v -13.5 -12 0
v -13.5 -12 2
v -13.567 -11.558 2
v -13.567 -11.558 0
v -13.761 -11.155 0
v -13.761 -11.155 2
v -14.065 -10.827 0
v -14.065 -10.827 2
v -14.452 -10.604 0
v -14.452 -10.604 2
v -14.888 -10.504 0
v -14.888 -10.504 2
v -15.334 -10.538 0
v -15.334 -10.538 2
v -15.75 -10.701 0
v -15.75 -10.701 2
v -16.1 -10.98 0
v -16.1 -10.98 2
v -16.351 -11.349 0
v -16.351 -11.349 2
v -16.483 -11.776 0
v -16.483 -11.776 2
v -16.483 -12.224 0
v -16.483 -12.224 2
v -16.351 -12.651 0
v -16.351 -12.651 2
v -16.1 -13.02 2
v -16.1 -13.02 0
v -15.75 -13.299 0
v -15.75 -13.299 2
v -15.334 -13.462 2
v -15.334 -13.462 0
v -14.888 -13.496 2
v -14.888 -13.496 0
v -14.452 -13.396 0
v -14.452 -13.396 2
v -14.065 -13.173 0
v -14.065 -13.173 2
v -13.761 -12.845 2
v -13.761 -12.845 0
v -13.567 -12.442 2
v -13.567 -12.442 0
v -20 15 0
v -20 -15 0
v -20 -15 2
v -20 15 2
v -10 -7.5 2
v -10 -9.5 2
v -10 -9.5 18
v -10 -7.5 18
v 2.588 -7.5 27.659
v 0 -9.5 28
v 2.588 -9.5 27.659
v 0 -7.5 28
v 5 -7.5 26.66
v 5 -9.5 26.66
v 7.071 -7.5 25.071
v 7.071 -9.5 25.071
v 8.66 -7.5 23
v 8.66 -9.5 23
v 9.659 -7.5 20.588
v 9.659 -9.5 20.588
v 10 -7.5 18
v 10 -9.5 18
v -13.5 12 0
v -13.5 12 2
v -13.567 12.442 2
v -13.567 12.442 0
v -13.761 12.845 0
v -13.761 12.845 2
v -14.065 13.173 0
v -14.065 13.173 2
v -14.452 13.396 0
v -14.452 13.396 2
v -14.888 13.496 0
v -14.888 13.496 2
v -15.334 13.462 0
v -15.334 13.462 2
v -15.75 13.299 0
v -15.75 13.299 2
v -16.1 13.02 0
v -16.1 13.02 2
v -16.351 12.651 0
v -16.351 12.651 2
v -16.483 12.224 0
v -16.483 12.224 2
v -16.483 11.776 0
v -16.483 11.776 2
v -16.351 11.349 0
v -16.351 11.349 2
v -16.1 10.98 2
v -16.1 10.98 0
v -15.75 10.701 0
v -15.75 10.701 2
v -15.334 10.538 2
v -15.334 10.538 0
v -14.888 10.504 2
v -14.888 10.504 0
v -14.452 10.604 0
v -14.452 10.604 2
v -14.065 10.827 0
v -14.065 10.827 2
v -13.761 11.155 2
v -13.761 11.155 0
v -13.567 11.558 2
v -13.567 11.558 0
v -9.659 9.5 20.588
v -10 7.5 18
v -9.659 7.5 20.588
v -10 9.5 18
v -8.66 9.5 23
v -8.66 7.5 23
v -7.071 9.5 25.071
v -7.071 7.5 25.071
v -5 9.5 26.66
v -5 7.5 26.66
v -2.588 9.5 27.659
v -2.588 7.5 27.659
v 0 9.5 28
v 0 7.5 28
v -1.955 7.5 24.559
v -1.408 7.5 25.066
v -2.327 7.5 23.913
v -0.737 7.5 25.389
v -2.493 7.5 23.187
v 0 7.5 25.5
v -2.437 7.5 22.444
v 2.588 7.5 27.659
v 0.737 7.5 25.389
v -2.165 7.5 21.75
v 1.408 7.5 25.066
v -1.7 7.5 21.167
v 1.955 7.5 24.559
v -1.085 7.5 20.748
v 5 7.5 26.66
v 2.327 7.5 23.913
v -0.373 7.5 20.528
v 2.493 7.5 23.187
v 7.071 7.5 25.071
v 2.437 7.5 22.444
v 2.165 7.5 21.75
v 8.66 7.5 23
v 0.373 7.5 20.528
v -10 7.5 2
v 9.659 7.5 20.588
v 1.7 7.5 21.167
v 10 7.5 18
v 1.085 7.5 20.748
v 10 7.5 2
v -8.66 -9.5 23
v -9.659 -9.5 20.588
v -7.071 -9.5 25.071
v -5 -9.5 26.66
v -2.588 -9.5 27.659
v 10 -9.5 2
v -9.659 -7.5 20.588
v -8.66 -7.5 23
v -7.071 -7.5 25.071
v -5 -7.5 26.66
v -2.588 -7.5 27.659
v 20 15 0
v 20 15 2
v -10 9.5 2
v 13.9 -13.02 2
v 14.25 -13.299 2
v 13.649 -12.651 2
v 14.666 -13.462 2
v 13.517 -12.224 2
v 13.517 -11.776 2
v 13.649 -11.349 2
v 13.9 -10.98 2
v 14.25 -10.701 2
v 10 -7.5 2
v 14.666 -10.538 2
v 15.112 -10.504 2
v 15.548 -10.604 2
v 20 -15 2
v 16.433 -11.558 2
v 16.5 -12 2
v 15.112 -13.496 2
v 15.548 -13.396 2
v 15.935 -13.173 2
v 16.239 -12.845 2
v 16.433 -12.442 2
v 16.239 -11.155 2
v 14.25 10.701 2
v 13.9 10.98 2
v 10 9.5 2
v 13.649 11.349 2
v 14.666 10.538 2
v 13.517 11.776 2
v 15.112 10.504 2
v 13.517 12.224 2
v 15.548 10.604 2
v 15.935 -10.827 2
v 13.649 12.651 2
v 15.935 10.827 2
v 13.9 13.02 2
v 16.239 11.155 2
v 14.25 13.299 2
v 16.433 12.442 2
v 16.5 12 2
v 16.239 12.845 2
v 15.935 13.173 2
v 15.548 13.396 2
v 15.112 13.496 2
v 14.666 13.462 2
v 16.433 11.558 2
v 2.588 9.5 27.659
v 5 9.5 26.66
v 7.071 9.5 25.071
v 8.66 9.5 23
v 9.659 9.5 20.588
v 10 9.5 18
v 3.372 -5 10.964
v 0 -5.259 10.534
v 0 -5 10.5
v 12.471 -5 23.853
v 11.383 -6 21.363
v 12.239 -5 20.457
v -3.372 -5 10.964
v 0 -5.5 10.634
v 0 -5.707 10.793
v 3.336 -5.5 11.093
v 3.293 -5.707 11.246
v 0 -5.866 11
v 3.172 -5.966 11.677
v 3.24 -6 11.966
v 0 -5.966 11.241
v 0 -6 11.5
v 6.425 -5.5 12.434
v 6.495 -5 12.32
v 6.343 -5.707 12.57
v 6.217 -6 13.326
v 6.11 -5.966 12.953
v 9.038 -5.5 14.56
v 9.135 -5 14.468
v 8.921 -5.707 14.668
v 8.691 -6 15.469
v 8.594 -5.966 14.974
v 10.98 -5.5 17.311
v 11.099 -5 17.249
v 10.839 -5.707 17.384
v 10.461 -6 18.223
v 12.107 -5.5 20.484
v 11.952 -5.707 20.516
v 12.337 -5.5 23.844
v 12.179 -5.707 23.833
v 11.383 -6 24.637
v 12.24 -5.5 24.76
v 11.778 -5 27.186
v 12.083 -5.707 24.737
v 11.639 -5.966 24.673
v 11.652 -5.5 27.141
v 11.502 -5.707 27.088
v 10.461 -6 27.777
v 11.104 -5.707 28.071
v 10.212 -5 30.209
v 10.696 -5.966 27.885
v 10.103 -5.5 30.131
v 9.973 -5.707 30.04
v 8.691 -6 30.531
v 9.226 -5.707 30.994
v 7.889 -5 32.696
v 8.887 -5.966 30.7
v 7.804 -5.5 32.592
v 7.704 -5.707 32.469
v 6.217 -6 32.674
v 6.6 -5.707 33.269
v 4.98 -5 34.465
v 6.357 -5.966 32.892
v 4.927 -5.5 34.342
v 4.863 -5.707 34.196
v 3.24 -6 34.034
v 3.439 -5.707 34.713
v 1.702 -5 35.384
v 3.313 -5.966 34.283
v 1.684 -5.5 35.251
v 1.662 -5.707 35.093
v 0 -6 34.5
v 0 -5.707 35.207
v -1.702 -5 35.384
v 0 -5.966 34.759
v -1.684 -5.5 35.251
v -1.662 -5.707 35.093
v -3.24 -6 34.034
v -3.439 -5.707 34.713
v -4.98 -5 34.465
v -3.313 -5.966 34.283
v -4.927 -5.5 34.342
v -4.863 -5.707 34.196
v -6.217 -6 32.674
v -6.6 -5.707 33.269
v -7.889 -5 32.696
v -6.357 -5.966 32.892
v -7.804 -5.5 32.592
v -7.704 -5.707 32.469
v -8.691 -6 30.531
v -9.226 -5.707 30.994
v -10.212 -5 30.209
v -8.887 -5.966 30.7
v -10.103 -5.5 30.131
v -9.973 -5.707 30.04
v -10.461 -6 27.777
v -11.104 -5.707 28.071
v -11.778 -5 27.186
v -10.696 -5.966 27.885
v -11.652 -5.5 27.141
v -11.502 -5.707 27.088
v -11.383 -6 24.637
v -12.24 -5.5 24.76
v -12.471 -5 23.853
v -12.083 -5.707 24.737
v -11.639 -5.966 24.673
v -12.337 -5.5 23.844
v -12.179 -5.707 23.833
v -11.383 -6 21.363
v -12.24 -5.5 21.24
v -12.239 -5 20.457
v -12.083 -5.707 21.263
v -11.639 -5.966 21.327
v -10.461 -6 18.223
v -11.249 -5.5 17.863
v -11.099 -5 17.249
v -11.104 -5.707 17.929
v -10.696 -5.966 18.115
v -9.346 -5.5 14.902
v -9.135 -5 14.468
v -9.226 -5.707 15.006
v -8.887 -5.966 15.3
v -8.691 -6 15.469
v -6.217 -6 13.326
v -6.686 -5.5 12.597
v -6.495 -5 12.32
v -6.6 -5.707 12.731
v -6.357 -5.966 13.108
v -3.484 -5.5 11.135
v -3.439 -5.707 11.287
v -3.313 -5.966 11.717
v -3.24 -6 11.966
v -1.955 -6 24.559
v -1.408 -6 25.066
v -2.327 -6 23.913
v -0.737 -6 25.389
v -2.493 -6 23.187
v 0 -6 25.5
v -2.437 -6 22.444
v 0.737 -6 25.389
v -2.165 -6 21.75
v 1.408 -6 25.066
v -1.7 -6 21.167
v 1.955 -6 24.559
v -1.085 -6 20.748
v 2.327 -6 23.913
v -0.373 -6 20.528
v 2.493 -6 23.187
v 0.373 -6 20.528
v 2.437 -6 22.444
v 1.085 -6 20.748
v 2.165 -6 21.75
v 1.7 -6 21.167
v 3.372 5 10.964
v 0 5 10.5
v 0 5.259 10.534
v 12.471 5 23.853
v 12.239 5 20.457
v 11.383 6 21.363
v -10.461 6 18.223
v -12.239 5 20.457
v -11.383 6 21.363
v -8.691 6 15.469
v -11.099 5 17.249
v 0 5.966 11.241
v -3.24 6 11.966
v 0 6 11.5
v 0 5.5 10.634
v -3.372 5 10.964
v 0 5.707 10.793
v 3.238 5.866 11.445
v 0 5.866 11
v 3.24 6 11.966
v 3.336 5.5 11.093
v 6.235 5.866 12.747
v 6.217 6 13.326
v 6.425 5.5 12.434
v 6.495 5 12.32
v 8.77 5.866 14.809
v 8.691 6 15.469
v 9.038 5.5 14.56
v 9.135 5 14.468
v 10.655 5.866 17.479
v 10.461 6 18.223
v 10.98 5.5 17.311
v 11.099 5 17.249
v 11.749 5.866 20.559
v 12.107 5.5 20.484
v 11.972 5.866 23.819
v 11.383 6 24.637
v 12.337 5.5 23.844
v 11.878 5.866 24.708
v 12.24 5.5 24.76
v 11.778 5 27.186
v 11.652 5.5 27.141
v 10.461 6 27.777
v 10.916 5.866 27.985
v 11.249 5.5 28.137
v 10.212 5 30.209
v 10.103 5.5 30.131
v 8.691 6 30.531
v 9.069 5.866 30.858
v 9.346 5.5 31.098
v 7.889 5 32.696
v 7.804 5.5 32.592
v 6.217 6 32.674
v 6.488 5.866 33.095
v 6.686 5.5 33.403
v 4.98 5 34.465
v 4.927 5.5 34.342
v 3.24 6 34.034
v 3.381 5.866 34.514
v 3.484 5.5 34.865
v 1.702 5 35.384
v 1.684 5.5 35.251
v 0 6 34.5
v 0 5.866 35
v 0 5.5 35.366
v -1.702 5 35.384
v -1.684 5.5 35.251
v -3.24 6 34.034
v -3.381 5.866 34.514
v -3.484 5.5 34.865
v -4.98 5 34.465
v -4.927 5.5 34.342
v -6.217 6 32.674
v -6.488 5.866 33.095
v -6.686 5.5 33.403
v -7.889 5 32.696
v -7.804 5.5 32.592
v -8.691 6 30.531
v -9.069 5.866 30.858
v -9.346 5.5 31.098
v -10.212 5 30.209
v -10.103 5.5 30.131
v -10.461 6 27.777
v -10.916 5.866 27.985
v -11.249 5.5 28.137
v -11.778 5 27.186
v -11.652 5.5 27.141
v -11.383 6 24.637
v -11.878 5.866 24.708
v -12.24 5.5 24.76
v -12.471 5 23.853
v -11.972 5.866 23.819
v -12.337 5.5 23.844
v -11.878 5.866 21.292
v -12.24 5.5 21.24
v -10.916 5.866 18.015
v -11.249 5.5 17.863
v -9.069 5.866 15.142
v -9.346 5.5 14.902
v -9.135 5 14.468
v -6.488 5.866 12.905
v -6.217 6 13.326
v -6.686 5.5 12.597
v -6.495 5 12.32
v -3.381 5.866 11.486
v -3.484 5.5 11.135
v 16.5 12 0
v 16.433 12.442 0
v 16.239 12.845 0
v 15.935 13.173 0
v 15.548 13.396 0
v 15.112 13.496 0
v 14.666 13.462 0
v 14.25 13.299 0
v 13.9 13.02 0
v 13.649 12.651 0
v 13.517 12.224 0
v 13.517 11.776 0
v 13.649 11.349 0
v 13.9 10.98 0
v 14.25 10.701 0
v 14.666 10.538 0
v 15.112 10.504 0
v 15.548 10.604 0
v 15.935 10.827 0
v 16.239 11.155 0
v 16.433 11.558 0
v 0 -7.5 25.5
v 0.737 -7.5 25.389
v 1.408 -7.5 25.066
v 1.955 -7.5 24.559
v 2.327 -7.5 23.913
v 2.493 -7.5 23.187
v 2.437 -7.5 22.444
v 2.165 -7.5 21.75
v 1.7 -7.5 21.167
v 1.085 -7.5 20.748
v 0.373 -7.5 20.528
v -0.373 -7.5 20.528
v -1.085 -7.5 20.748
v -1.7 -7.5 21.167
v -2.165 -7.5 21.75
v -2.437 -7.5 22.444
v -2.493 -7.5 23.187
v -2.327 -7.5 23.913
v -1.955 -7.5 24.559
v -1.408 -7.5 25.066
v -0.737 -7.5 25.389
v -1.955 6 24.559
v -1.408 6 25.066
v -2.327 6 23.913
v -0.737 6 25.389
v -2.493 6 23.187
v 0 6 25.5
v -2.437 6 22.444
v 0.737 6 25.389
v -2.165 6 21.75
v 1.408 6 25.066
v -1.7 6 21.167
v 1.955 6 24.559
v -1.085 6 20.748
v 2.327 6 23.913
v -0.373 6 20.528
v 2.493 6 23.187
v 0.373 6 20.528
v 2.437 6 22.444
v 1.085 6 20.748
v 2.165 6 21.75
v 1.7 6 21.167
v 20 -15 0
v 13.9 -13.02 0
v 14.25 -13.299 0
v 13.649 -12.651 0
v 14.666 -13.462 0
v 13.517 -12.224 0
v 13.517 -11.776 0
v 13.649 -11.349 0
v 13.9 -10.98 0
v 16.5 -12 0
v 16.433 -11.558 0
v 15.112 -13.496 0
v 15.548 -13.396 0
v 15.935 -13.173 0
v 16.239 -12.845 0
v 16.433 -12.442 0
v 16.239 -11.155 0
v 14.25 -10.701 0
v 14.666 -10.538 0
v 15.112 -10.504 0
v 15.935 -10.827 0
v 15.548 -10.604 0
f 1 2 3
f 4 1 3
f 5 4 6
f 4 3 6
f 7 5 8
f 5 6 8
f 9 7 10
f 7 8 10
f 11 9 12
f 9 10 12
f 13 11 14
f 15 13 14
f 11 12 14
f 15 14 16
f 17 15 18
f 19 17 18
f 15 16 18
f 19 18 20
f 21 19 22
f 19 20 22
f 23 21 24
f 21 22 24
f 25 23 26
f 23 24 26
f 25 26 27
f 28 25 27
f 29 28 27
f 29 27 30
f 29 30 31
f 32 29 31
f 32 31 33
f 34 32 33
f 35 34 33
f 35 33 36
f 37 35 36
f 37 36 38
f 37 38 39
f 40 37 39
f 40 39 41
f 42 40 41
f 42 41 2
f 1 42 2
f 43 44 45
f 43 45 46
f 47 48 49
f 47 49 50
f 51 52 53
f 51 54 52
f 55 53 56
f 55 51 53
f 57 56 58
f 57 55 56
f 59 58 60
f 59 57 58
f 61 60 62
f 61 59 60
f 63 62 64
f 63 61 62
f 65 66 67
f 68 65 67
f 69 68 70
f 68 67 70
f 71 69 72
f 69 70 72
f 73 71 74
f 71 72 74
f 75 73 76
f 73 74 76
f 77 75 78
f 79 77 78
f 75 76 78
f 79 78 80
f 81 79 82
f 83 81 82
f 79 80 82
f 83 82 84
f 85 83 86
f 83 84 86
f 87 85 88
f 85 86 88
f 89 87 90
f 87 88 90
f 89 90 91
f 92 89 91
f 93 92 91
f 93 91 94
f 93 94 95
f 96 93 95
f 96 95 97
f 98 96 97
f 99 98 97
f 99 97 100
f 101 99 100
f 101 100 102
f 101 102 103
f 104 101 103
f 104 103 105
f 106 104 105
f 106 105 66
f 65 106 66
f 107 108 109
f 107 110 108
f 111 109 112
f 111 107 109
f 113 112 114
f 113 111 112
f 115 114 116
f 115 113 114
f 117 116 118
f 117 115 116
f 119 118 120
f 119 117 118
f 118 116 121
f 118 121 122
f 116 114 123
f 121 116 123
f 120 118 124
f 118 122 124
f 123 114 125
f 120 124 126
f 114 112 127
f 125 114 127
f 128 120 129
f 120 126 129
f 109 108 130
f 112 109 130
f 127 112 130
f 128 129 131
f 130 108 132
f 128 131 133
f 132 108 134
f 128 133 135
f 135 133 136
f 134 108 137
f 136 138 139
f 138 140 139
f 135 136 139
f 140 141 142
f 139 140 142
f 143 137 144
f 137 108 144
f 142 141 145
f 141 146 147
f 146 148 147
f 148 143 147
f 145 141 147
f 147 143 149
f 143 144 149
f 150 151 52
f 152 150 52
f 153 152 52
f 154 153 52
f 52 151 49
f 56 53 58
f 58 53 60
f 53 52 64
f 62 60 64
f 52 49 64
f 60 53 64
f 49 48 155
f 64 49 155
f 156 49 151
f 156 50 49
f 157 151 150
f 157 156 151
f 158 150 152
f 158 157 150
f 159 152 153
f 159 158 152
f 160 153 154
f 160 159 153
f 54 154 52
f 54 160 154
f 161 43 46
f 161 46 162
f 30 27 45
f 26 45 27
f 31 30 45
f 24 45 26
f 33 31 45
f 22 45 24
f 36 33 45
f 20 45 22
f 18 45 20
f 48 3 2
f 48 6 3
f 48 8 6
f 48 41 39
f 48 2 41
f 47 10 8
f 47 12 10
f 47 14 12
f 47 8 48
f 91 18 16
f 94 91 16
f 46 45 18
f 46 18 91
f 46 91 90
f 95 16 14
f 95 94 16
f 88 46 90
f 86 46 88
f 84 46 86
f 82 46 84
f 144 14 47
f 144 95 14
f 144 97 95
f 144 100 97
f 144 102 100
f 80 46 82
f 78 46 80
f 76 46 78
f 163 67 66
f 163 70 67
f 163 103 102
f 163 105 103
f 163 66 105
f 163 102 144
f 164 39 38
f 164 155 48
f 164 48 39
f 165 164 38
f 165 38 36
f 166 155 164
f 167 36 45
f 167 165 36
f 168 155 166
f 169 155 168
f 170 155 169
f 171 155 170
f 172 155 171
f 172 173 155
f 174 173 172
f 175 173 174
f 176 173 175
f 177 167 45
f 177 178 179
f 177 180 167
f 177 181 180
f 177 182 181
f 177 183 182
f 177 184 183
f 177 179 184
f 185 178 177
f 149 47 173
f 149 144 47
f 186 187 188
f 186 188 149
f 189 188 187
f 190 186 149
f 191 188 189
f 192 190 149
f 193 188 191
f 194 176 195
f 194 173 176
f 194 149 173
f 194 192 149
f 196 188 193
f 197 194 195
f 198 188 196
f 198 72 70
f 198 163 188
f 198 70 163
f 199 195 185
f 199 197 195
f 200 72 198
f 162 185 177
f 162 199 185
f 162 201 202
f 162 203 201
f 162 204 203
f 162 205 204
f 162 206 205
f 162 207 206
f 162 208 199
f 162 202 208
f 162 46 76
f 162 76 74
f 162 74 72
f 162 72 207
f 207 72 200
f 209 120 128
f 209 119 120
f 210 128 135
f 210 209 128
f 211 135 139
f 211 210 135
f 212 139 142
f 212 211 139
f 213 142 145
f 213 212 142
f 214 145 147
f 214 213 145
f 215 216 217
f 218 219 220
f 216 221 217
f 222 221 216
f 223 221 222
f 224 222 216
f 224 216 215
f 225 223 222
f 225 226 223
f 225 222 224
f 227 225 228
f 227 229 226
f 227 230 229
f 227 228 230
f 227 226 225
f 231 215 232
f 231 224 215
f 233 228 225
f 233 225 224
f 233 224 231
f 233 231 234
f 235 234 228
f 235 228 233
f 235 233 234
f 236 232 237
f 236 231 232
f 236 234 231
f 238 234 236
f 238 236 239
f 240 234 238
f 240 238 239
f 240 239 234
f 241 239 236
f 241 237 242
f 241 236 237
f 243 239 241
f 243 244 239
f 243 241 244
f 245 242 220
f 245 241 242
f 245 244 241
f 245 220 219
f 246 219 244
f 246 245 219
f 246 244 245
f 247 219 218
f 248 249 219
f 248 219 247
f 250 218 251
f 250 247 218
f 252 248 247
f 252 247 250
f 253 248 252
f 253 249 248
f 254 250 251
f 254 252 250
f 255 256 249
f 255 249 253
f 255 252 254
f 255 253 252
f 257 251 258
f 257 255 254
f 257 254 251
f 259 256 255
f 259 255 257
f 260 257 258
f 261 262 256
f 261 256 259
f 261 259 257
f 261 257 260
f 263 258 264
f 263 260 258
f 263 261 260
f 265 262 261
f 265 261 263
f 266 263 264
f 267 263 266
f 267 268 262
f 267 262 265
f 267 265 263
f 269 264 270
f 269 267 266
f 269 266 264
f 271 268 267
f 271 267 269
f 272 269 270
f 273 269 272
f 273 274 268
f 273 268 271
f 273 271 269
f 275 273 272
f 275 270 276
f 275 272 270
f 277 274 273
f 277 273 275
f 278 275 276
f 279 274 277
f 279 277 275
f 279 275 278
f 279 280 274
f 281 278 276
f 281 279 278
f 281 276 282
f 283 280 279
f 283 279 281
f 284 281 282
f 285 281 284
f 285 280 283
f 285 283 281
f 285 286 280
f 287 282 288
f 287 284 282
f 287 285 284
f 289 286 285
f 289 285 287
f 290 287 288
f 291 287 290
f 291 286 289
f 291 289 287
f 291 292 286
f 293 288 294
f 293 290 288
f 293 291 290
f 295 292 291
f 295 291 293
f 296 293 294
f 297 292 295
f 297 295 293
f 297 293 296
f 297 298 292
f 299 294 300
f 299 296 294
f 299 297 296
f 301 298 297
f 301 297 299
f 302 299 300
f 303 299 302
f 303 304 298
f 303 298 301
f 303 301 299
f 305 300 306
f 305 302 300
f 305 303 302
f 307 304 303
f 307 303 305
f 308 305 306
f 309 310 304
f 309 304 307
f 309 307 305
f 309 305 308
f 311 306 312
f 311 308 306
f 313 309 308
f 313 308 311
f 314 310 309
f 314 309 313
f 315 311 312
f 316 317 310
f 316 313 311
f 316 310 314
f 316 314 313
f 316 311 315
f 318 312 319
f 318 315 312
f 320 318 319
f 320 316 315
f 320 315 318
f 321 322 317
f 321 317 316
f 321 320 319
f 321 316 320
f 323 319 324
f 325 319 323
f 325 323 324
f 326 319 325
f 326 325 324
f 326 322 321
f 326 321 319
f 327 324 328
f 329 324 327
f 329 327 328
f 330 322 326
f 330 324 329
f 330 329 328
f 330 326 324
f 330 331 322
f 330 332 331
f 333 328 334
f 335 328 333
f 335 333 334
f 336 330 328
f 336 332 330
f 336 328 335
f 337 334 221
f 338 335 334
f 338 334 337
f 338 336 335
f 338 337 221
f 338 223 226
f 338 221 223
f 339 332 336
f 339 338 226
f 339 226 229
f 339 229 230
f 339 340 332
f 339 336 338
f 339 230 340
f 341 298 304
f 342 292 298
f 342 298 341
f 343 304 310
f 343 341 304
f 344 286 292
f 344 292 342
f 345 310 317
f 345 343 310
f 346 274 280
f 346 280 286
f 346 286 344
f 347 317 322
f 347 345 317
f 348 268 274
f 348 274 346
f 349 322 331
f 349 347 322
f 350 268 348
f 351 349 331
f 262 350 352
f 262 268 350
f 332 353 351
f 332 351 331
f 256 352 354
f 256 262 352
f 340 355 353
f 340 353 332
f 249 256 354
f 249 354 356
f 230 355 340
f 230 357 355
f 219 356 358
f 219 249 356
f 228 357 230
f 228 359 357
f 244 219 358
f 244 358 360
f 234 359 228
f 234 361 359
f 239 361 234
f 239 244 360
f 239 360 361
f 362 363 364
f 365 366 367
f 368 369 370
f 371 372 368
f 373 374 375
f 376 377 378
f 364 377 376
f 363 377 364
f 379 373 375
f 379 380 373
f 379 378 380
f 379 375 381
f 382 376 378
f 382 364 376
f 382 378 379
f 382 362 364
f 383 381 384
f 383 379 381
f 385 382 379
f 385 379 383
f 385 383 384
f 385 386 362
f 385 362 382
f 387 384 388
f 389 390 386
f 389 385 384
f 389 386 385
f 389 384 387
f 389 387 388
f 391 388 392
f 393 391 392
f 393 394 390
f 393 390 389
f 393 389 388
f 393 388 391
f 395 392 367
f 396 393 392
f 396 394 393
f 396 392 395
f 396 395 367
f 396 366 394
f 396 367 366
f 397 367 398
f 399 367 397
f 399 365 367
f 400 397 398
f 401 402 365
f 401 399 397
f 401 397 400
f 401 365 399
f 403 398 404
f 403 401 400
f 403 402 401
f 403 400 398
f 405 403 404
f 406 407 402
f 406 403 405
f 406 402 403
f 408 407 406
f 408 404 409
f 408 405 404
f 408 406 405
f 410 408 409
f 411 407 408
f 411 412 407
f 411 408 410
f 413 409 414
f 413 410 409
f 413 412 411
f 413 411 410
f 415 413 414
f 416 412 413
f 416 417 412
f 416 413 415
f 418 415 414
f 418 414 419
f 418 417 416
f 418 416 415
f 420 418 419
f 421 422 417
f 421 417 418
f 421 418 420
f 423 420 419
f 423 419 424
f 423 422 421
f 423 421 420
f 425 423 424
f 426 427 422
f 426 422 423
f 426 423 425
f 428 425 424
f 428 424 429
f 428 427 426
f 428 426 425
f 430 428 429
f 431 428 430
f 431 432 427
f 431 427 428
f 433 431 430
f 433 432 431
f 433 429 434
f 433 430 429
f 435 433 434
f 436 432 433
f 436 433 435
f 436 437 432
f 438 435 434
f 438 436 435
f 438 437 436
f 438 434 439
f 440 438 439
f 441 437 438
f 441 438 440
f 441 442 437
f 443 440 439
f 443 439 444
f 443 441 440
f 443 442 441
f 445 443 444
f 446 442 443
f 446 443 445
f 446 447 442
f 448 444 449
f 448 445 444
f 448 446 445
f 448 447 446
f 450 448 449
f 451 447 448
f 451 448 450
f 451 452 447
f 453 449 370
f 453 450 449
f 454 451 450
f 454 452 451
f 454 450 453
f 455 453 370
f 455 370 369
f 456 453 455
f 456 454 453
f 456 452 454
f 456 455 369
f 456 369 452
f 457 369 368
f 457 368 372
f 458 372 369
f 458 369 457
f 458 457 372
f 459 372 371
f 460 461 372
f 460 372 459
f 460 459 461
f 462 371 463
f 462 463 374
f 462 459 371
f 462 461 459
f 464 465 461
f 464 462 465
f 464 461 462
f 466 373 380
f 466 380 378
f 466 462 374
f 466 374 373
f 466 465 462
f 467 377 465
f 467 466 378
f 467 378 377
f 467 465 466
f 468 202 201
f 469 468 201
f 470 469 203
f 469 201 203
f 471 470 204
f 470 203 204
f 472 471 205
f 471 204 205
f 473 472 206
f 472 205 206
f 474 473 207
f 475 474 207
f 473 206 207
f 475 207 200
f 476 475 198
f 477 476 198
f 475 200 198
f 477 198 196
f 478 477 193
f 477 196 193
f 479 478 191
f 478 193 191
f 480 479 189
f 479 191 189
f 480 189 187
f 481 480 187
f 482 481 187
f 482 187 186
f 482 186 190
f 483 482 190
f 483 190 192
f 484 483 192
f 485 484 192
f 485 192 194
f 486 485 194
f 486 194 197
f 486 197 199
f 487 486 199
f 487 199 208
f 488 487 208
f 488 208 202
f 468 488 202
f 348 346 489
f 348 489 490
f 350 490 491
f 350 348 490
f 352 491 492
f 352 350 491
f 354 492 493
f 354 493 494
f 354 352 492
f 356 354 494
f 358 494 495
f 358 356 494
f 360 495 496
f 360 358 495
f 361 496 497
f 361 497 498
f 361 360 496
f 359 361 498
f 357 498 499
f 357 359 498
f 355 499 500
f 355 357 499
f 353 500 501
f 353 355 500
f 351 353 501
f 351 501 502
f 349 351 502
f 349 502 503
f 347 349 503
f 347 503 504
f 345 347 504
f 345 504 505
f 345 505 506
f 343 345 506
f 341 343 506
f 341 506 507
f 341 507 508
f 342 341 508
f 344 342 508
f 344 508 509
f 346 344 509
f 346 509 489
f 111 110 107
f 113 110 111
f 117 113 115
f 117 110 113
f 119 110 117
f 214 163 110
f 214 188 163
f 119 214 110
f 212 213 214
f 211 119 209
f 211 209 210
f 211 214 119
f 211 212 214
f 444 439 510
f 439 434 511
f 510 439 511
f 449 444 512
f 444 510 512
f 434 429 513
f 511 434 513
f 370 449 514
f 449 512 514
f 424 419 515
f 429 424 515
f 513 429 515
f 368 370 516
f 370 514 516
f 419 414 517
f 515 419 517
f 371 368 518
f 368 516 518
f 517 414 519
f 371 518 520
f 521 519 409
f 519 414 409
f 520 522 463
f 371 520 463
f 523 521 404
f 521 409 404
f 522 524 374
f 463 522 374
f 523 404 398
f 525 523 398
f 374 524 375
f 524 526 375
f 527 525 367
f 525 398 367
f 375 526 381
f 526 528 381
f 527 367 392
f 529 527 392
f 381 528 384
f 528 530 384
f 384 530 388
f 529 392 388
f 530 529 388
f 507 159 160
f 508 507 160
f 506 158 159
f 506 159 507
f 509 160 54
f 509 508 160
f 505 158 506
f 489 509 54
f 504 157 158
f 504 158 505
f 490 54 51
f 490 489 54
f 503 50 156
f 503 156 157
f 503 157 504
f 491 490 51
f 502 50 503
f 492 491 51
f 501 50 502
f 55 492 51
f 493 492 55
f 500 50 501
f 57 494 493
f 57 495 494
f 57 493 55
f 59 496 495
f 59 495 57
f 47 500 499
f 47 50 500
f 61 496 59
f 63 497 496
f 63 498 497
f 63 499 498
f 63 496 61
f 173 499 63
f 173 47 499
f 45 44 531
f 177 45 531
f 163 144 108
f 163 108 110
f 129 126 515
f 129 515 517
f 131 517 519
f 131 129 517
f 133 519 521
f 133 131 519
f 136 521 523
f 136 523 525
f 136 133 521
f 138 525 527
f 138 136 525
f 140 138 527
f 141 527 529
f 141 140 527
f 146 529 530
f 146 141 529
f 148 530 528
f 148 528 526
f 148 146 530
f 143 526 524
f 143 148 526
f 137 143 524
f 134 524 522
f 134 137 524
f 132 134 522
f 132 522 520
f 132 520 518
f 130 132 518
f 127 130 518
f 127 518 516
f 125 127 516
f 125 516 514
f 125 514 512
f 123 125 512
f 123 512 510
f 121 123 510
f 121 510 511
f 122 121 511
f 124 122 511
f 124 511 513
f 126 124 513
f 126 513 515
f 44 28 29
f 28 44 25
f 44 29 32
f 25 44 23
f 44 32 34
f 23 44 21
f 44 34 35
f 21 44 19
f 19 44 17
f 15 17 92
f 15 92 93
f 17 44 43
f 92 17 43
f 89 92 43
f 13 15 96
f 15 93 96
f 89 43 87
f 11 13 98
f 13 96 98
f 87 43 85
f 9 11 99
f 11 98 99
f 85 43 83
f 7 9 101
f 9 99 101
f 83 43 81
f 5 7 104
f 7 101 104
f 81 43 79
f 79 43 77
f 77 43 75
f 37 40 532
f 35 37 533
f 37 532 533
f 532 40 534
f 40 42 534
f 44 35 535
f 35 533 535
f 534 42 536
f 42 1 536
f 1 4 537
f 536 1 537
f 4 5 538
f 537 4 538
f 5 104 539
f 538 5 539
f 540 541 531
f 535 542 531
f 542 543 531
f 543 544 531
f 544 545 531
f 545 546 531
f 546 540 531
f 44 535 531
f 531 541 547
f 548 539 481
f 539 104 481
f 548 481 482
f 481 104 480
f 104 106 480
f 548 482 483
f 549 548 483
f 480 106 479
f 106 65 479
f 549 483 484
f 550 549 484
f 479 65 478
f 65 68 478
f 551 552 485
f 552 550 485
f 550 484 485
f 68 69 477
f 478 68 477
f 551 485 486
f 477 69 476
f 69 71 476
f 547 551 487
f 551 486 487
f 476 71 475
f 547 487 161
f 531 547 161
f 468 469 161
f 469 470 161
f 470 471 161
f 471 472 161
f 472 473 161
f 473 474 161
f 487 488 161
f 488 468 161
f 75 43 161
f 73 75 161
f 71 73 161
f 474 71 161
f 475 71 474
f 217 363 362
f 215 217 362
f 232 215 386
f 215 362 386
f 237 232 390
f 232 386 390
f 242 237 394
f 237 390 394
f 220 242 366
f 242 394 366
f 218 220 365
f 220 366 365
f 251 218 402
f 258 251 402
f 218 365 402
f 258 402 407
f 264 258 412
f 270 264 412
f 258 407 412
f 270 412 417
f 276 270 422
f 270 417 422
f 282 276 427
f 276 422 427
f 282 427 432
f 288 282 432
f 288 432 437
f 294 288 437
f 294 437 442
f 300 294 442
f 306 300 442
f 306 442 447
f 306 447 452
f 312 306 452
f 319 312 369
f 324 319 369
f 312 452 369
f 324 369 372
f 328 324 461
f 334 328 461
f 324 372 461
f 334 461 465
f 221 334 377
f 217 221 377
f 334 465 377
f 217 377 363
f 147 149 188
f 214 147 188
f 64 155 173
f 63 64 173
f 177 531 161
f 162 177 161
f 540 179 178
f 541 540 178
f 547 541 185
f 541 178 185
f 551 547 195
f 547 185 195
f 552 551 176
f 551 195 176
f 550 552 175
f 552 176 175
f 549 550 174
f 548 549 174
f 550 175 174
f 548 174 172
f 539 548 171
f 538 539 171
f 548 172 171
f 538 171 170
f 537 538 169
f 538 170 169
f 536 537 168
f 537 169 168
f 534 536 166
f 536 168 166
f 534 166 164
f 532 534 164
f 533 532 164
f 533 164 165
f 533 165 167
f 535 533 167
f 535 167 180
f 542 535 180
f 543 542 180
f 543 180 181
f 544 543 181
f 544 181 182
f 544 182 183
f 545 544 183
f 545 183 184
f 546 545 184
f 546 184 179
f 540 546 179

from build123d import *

# Parameters (mm, degrees)
SKETCH1_W                = 40
SKETCH1_H                = 30
BOSS_EXTRUDE1_DEPTH      = 2
SKETCH2_R                = 1.5
CUT_EXTRUDE1_DEPTH       = 26.079872408
SKETCH3_W                = 20
SKETCH3_H                = 2
BOSS_EXTRUDE2_DEPTH      = 26
SKETCH4_R                = 2.5
BOSS_EXTRUDE3_DEPTH      = 19
BOSS_EXTRUDE4_DEPTH      = 6
BOSS_EXTRUDE4_DEPTH_BACK = 6
SKETCH5_R                = 12.5
FILLET1_R                = 10
FILLET2_R                = 1


with BuildPart() as part:
    # Sketch1 → Boss-Extrude1 (new body)
    with BuildSketch(Plane.XY):
        Rectangle(SKETCH1_W, SKETCH1_H)
    extrude(amount=BOSS_EXTRUDE1_DEPTH)

    # Sketch2 → Cut-Extrude1 (cut, through all)
    with BuildSketch(Plane.XY.offset(2)):
        with Locations((-15, 12)):
            Circle(SKETCH2_R)
        with Locations((15, 12)):
            Circle(SKETCH2_R)
        with Locations((15, -12)):
            Circle(SKETCH2_R)
        with Locations((-15, -12)):
            Circle(SKETCH2_R)
    extrude(amount=-CUT_EXTRUDE1_DEPTH, mode=Mode.SUBTRACT)

    # Sketch3 → Boss-Extrude2 (add)
    with BuildSketch(Plane.XY.offset(2)):
        with Locations((0, -8.5)):
            Rectangle(SKETCH3_W, SKETCH3_H)
        with Locations((0, 8.5)):
            Rectangle(SKETCH3_W, SKETCH3_H)
    extrude(amount=BOSS_EXTRUDE2_DEPTH)

    # Sketch4 → Boss-Extrude3 (add)
    with BuildSketch(Plane(origin=(0, 9.5, 0), x_dir=(1, 0, 0), z_dir=(0, 1, 0))):
        with Locations(Location((0, -23, 0), (0, 0, 270))):
            Circle(SKETCH4_R)
    extrude(amount=-BOSS_EXTRUDE3_DEPTH)

    # Sketch5 → Boss-Extrude4 (add, two sides: drawn at the far end of the back side and taken through both)
    with BuildSketch(Plane(origin=(0, 0, 0), x_dir=(-1, 0, 0), z_dir=(0, -1, 0)).offset(-BOSS_EXTRUDE4_DEPTH_BACK)):
        with Locations(Location((0, -23, 0), (0, 0, 90))):
            Circle(SKETCH5_R)
    extrude(amount=BOSS_EXTRUDE4_DEPTH + BOSS_EXTRUDE4_DEPTH_BACK)

    # Fillet1
    fillet1_edges = [part.edges().sort_by_distance(p)[0] for p in [
        (10, -8.5, 28),
        (-10, -8.5, 28),
        (10, 8.5, 28),
        (-10, 8.5, 28),
    ]]
    fillet(fillet1_edges, radius=FILLET1_R - 0.0001)  # a hair under: the kernel refuses the full size

    # Fillet2
    fillet2_edges = [part.edges().sort_by_distance(p)[0] for p in [
        (0, 6, 35.5),
        (0, -6, 35.5),
    ]]
    fillet(fillet2_edges, radius=FILLET2_R)


solid = part.part
